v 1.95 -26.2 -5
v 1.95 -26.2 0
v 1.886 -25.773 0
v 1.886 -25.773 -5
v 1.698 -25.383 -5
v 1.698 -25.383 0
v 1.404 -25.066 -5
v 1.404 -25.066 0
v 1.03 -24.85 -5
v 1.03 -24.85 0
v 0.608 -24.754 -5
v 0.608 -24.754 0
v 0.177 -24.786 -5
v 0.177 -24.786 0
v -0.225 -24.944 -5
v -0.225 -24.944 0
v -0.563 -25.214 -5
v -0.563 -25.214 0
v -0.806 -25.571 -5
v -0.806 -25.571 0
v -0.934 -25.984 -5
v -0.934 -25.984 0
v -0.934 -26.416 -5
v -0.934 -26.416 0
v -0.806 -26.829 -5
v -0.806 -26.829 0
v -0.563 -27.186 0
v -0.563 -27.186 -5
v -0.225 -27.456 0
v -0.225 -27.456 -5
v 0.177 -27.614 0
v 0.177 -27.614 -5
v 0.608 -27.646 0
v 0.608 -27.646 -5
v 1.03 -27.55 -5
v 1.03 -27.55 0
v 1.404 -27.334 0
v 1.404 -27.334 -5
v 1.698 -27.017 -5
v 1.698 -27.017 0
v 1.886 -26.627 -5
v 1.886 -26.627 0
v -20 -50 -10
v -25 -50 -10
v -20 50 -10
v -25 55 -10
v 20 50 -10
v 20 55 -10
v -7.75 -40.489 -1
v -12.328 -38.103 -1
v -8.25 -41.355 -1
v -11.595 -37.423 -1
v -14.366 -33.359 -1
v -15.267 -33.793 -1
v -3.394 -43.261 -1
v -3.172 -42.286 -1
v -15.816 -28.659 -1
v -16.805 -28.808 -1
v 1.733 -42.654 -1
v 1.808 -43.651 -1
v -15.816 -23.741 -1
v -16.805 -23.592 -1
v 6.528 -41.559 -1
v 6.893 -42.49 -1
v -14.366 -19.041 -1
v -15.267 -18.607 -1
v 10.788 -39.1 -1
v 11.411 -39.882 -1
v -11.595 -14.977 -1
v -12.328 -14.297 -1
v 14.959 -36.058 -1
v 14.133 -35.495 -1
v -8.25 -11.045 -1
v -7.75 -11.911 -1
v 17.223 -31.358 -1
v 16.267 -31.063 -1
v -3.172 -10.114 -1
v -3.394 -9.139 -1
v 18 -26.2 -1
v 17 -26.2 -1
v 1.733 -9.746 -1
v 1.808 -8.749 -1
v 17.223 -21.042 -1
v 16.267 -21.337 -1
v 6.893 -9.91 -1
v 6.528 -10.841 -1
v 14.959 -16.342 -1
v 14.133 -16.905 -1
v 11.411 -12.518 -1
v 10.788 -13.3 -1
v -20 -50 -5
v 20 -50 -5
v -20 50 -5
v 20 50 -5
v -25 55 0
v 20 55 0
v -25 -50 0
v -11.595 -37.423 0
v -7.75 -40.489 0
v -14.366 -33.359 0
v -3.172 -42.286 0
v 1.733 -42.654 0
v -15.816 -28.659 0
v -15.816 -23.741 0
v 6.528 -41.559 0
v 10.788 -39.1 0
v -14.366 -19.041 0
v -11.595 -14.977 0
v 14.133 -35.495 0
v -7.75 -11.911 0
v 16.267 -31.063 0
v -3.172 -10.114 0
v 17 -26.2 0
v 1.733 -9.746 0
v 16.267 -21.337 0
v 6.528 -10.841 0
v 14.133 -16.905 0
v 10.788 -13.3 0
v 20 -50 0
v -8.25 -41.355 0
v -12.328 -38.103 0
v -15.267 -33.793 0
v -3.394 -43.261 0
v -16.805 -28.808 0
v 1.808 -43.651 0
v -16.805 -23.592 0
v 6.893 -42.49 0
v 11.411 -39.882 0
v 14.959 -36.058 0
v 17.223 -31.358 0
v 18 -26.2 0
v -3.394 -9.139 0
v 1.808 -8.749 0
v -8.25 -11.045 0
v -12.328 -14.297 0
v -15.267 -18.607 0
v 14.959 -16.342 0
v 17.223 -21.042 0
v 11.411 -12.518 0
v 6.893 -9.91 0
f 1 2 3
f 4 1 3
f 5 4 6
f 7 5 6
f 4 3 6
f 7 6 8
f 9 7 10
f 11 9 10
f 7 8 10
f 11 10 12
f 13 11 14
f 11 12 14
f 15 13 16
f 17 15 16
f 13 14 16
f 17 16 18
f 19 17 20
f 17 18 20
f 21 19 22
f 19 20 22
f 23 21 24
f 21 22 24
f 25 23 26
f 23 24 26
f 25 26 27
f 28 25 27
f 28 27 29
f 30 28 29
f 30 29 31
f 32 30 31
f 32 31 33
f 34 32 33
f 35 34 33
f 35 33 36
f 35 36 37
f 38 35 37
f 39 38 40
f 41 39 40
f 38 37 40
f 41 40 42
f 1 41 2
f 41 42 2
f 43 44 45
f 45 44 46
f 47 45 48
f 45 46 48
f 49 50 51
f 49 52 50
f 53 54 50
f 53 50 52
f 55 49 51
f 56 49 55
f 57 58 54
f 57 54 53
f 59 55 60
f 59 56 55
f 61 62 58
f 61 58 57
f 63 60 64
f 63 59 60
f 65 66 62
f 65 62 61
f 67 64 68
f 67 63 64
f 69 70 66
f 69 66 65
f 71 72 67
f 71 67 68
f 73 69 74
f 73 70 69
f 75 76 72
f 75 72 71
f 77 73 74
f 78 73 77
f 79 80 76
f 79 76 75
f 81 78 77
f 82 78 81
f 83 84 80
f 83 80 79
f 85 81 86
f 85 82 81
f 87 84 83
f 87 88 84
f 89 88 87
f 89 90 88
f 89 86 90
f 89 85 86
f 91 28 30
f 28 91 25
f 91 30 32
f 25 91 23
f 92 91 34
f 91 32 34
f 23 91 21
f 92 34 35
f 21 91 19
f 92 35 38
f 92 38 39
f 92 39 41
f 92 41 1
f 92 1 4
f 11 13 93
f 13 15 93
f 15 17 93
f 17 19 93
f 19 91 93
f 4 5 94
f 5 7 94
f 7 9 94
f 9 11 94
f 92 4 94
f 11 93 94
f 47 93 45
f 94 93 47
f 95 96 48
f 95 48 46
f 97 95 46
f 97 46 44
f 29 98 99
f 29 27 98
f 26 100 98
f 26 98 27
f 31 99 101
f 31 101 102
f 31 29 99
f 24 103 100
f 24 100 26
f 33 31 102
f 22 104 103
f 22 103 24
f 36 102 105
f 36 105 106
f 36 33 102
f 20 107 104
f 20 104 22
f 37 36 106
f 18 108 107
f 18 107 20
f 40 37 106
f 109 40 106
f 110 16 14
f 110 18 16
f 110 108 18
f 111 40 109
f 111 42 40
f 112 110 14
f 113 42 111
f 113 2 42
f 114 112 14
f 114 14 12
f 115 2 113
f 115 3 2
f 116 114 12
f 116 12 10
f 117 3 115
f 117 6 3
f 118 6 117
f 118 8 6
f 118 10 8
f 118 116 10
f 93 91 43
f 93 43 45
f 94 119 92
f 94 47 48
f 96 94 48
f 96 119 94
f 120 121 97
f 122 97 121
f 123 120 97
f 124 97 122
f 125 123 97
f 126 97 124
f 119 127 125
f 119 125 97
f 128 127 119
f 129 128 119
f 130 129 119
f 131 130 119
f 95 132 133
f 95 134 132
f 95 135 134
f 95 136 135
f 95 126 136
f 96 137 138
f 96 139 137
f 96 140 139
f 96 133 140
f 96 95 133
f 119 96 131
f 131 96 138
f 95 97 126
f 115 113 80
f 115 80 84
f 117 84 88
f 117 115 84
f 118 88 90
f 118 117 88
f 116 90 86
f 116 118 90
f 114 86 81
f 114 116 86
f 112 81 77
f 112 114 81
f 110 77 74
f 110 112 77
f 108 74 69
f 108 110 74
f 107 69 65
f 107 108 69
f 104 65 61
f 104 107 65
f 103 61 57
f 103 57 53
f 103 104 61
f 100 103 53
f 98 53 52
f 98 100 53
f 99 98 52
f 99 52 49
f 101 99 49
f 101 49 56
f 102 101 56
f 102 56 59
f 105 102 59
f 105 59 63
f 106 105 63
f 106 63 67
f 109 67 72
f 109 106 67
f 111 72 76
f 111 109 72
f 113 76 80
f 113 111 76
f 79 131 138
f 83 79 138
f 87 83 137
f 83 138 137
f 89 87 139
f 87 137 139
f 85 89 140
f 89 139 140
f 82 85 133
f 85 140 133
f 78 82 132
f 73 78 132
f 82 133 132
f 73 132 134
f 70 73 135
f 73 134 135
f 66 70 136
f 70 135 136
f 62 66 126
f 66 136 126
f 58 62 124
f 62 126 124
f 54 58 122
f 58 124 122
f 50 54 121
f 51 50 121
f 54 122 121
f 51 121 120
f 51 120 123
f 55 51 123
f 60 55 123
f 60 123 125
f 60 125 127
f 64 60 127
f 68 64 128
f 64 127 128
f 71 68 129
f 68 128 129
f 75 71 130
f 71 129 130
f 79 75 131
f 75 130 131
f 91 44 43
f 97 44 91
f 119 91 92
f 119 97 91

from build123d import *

# Parameters (mm, degrees)
F0_W     = 40
F0_H     = 100
F0_R     = 17.5
F0_R_2   = 1.45
F1_DEPTH = 5
F2_W     = 5
F2_H     = 100
F3_DEPTH = 10
F4_R     = 17.5
F4_R_2   = 16.5
F5_DEPTH = 1


with BuildPart() as f1:
    # F0 (on Top) → F1 (new body)
    with BuildSketch(Plane.XY):
        Rectangle(F0_W, F0_H)
        with Locations((0.5, -26.2)):
            Circle(F0_R, mode=Mode.SUBTRACT)
        with Locations((0.5, -26.2)):
            Circle(F0_R)
        with Locations((0.5, -26.2)):
            Circle(F0_R_2, mode=Mode.SUBTRACT)
    extrude(amount=-F1_DEPTH)

    # F2 (on face) → F3 (join)
    with BuildSketch(Plane.XY):
        with Locations((-22.5, 0)):
            Rectangle(F2_W, F2_H)
        Polygon((-25, 50), (-20, 50), (20, 50), (20, 55), (-25, 55), align=None)
    extrude(amount=-F3_DEPTH)

    # F4 (on face) → F5 (cut)
    with BuildSketch(Plane.XY):
        with Locations((0.5, -26.2)):
            Circle(F4_R)
        with Locations((0.5, -26.2)):
            Circle(F4_R_2, mode=Mode.SUBTRACT)
    extrude(amount=-F5_DEPTH, mode=Mode.SUBTRACT)


solid = f1.part
